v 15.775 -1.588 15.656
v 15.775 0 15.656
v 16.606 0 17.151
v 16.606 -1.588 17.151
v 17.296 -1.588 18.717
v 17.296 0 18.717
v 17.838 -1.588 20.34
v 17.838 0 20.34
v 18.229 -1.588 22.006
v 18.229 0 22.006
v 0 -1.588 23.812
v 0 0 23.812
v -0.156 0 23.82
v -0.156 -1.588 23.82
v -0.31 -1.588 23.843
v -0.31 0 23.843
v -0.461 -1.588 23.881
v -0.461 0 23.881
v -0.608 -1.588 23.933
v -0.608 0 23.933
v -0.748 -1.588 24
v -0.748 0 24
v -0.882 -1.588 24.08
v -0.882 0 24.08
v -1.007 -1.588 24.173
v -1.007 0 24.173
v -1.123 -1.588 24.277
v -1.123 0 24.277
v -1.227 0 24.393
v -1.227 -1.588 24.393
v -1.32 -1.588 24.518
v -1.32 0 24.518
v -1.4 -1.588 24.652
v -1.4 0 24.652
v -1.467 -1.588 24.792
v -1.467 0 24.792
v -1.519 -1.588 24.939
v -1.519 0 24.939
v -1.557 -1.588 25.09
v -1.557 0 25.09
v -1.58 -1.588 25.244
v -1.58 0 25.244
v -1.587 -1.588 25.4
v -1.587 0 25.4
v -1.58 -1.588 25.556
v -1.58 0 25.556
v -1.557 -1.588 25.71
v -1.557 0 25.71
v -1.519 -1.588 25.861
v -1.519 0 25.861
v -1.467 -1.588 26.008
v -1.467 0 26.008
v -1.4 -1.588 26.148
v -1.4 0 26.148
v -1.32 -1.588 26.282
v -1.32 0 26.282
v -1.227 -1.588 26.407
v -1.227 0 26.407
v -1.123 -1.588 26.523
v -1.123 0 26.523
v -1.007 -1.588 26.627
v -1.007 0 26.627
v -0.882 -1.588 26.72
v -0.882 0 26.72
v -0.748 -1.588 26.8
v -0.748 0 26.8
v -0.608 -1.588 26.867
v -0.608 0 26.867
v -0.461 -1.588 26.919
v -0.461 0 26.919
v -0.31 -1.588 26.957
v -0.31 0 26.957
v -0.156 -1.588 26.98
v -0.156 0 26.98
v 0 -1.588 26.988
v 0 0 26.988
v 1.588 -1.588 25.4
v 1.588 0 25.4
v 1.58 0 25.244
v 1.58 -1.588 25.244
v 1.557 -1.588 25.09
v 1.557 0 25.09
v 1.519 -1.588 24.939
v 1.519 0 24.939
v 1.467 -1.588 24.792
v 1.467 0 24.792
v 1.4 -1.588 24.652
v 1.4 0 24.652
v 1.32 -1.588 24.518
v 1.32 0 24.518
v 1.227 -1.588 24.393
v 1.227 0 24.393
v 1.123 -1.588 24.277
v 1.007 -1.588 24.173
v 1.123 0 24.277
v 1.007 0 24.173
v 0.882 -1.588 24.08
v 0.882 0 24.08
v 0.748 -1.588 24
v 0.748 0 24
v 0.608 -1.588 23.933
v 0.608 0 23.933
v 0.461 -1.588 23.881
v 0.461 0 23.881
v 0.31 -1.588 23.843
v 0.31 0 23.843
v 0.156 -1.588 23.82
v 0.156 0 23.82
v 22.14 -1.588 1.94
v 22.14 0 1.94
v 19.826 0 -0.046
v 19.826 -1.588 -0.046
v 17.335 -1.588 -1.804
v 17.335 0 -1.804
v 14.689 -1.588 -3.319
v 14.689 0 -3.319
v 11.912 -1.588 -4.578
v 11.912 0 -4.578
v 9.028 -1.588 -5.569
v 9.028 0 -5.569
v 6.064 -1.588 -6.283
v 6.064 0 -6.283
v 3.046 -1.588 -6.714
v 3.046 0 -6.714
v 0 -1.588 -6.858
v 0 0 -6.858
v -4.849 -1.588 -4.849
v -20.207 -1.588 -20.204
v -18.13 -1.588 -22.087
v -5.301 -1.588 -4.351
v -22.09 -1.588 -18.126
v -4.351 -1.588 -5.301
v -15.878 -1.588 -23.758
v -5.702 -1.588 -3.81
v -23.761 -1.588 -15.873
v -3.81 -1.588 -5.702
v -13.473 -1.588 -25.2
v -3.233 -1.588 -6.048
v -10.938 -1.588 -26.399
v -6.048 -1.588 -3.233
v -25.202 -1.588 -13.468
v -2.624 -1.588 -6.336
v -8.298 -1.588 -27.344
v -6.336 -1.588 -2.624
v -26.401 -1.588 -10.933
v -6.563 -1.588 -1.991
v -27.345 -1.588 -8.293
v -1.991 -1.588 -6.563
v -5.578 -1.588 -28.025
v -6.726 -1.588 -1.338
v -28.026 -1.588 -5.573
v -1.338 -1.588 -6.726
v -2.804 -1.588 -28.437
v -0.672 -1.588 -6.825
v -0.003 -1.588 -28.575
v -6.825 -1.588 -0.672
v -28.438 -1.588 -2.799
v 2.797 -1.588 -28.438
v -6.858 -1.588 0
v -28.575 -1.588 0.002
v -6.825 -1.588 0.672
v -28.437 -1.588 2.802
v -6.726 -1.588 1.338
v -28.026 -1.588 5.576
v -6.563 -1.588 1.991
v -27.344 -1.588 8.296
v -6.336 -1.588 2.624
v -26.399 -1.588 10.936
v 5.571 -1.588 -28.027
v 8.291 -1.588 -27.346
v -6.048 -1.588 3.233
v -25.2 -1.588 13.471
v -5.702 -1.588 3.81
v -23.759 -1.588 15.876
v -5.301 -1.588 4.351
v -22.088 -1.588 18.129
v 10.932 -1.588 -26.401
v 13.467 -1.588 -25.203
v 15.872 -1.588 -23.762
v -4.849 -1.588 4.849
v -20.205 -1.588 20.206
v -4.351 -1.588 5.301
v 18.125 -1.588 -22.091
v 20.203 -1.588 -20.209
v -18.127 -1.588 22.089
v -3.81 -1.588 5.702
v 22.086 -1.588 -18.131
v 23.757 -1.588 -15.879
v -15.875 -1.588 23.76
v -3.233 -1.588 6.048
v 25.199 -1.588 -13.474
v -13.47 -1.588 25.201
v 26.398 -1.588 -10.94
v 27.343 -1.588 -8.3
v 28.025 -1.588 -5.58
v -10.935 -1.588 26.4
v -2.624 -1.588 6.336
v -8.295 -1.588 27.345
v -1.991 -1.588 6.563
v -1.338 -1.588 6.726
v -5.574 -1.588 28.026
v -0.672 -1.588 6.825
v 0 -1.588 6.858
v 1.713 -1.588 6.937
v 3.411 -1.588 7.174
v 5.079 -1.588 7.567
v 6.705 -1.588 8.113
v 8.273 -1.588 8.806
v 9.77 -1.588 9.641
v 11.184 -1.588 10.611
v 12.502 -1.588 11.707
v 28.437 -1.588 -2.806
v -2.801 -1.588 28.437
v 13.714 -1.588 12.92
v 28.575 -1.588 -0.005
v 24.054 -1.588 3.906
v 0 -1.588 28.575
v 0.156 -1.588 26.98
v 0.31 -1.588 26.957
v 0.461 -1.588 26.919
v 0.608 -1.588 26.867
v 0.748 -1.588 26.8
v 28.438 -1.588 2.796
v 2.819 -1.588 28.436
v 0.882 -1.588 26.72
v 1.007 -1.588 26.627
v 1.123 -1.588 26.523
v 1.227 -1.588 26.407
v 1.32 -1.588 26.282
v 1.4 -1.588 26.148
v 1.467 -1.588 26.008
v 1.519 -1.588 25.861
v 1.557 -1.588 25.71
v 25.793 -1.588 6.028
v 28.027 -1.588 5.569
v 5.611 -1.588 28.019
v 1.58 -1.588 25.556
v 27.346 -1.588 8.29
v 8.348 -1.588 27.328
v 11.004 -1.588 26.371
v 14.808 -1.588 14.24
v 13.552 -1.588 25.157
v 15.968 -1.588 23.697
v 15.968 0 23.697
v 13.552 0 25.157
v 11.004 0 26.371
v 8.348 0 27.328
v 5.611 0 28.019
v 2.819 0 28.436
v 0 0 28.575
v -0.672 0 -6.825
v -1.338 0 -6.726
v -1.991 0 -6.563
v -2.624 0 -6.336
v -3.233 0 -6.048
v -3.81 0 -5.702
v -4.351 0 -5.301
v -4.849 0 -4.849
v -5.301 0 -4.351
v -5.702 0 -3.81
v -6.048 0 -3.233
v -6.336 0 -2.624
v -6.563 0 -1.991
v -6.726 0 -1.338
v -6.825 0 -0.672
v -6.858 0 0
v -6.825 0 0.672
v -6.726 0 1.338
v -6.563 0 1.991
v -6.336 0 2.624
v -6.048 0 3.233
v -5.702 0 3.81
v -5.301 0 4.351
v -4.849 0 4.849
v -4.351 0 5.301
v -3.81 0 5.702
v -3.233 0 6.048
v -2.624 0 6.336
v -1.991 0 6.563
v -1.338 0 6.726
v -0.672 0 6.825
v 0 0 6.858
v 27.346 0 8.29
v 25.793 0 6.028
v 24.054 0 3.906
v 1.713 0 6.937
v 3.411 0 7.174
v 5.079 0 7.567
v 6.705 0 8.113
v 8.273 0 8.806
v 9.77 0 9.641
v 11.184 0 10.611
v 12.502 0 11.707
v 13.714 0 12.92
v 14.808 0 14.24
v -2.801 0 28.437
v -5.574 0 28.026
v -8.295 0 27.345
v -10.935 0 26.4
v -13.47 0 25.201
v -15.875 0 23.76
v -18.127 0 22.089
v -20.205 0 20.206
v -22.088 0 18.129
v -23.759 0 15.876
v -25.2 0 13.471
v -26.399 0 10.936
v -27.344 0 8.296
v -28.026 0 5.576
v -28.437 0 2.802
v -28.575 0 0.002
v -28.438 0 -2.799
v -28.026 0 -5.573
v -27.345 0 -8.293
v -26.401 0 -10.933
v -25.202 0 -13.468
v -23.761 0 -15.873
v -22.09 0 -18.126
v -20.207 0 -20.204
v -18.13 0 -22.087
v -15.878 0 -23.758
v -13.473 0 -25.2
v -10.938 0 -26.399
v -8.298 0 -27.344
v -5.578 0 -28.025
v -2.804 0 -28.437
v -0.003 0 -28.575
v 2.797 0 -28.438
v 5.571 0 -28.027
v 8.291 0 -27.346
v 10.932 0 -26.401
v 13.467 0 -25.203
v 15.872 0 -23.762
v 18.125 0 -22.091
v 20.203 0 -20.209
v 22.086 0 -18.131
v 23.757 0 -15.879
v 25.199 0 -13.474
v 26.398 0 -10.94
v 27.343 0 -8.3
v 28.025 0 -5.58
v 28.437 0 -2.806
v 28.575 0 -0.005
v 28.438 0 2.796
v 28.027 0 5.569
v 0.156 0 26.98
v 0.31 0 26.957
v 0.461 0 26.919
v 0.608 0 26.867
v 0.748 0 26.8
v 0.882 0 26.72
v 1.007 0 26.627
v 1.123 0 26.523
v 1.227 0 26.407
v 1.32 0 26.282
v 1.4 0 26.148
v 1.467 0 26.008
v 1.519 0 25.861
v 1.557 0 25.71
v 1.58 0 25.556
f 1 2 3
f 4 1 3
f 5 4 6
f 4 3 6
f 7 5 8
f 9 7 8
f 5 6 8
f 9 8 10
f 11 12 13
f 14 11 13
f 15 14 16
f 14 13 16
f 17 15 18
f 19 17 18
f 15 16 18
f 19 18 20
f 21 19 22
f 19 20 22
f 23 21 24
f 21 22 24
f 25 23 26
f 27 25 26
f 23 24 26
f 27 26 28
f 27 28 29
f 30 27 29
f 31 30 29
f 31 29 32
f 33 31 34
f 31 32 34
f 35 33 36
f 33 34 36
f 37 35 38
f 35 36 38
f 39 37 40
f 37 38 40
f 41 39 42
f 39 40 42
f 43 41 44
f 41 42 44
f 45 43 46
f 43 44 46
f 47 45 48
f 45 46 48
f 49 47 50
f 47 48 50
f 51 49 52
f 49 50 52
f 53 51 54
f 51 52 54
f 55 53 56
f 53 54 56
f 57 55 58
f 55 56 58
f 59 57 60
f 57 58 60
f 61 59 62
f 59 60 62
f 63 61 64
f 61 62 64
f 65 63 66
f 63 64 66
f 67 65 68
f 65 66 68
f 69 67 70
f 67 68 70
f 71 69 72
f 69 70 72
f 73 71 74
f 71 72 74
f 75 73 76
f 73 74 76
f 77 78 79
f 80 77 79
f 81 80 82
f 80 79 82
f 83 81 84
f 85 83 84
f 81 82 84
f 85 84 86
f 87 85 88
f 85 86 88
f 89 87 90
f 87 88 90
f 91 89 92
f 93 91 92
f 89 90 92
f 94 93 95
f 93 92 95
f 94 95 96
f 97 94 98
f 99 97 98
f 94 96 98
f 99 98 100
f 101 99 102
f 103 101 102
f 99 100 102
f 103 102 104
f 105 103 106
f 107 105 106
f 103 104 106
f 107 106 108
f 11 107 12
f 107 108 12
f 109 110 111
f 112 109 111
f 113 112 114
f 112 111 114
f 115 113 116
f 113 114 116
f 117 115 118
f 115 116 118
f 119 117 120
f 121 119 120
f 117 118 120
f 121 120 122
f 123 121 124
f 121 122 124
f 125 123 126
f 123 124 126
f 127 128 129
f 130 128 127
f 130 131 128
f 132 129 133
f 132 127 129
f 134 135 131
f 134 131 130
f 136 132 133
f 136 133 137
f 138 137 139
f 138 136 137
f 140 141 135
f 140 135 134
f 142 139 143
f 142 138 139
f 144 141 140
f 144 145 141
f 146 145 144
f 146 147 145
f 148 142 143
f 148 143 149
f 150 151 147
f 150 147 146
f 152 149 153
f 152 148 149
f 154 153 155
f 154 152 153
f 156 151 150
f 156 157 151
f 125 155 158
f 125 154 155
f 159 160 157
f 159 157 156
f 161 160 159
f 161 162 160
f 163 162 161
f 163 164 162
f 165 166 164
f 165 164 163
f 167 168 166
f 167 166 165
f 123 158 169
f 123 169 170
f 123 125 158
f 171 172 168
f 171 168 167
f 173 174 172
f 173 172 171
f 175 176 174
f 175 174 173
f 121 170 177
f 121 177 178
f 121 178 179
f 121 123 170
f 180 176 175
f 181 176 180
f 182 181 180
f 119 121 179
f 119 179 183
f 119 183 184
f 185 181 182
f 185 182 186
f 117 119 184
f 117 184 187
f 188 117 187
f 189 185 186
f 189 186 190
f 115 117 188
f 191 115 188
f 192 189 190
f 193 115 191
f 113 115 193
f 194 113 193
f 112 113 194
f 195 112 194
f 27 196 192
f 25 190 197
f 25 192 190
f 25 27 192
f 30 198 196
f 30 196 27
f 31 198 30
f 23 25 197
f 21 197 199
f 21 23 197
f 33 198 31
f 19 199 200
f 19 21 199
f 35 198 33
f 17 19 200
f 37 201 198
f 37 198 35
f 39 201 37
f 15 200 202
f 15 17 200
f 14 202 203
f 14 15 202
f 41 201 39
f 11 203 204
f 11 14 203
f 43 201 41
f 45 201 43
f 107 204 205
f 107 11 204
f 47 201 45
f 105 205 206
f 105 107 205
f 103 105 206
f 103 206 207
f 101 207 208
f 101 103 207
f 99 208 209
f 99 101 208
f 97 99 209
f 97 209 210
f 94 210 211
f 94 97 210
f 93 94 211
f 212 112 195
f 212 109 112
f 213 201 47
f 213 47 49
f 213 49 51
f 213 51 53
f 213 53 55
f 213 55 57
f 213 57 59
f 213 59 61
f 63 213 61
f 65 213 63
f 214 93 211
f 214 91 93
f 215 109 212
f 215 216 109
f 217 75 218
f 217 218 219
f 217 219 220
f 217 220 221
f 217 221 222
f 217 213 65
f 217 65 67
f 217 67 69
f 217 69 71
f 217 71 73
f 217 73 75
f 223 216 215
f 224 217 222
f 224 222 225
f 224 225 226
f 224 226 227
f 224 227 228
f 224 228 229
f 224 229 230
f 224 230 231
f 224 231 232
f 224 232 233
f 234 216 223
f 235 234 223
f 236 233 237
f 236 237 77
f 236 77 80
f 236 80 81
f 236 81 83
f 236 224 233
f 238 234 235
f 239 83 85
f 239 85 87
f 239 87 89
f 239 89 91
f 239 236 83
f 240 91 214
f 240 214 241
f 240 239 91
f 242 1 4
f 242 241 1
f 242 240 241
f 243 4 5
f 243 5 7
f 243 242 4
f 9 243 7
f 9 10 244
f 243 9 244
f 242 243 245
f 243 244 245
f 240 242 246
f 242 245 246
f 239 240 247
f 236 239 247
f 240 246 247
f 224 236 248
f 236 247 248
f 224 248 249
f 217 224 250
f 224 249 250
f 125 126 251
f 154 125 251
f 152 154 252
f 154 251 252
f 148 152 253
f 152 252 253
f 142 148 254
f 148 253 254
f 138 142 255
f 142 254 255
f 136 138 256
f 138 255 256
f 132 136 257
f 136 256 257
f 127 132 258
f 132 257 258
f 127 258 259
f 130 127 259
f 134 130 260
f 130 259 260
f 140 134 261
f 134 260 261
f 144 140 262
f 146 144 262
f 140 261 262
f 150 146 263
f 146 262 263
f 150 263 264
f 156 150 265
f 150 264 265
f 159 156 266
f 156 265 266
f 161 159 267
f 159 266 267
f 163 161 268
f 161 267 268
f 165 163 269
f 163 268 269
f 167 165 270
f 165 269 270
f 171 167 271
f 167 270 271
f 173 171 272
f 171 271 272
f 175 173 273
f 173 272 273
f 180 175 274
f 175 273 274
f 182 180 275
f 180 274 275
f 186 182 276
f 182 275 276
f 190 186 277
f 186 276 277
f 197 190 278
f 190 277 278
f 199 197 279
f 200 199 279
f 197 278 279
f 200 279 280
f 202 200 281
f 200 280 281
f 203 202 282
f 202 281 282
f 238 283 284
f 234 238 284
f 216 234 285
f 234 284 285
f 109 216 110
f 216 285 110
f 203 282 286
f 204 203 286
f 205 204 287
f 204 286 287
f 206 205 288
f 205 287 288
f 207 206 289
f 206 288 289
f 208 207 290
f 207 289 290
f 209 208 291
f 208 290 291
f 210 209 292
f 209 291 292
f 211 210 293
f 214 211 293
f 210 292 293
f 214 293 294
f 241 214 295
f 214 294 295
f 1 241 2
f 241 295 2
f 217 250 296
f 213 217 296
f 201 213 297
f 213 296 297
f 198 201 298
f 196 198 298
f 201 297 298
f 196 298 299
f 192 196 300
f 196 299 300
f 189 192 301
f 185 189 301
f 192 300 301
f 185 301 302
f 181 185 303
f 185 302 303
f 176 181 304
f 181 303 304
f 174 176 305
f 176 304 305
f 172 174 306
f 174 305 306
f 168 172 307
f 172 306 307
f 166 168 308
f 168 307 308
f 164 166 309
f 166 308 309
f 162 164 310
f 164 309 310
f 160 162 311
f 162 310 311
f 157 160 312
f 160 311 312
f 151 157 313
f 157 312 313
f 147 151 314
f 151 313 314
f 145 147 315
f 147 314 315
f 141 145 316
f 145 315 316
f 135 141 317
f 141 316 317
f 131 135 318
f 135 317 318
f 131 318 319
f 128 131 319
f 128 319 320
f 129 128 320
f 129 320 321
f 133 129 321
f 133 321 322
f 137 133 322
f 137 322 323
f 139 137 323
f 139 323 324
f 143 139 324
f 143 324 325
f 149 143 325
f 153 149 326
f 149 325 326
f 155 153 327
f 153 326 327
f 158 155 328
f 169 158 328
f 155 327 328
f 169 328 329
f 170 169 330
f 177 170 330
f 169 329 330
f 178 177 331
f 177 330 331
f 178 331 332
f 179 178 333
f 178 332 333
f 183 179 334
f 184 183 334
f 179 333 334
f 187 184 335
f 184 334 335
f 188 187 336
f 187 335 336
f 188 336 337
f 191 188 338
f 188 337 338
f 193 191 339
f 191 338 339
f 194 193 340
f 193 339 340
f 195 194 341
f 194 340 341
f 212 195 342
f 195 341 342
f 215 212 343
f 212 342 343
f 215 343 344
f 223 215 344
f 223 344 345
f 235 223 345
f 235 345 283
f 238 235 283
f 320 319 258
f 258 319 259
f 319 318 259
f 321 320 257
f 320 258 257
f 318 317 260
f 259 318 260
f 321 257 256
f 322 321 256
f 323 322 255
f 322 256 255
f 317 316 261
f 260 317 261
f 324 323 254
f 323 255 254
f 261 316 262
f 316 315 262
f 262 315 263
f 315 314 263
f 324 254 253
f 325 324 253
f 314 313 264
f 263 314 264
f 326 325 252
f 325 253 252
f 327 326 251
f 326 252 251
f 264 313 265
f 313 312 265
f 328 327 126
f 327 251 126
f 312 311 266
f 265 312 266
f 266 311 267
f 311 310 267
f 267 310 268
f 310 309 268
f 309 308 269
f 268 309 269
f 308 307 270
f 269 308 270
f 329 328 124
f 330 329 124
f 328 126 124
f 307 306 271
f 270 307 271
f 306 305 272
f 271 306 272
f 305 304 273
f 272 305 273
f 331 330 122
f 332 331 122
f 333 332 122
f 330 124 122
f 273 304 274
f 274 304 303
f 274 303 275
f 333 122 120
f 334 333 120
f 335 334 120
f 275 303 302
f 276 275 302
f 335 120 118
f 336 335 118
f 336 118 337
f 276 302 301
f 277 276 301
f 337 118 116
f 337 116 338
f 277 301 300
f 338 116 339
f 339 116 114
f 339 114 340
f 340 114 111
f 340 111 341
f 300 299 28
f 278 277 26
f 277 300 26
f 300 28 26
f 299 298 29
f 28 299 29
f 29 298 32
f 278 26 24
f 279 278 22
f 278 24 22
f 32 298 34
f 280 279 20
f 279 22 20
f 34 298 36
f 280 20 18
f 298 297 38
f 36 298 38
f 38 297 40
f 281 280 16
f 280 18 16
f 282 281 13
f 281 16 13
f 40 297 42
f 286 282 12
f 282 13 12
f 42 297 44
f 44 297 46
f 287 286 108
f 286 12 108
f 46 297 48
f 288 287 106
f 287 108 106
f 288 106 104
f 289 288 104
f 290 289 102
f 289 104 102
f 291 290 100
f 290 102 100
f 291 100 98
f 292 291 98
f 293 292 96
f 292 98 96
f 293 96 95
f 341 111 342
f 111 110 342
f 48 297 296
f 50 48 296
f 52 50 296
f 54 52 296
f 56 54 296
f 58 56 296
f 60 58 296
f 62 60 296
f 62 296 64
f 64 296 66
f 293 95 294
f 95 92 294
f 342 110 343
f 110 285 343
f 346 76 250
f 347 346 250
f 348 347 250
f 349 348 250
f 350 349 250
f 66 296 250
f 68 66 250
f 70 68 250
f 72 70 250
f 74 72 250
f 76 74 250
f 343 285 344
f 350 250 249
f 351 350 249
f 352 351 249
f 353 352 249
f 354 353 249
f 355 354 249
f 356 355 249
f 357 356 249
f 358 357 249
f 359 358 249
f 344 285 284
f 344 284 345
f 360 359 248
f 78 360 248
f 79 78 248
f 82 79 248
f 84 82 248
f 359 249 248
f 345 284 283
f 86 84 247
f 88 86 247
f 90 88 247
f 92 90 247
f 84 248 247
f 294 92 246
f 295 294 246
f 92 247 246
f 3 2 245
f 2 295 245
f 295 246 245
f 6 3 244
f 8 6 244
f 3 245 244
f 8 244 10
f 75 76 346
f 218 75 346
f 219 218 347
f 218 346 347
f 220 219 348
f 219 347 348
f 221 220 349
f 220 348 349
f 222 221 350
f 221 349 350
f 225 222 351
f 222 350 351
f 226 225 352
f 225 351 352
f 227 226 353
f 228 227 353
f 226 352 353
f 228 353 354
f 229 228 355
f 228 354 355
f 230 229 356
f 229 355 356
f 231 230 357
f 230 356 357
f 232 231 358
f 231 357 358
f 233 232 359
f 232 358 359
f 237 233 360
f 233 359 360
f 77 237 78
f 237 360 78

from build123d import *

# Parameters (mm, degrees)
F1_DEPTH = 1.5875


with BuildPart() as f1:
    # F0 (on Front) → F1 (new body)
    with BuildSketch(Plane.XZ):
        with BuildLine():
            ThreePointArc((15.7750619272, 15.6556075), (17.2957745251, 18.7170405077), (18.2286550123, 22.0056075))
            ThreePointArc((18.2286550123, 22.0056075), (9.6881471574, 26.8825301945), (0, 28.575))
            Line((0, 28.575), (0, 26.9875))
            ThreePointArc((0, 26.9875), (1.1225320151, 26.5225320151), (1.5875, 25.4))
            ThreePointArc((1.5875, 25.4), (1.1225320151, 24.2774679849), (0, 23.8125))
            Line((0, 23.8125), (0, 22.225))
            ThreePointArc((0, 22.225), (8.5441426812, 20.5170234402), (15.7750619272, 15.6556075))
        make_face()
        with BuildLine():
            Line((0, 26.9875), (0, 28.575))
            ThreePointArc((0, 28.575), (-17.0243221699, -22.9500126287), (27.3461703442, 8.2896075))
            ThreePointArc((27.3461703442, 8.2896075), (24.9460595827, 4.9482842946), (22.140202071, 1.9396075))
            ThreePointArc((22.140202071, 1.9396075), (-15.0140409003, -16.3868606159), (0, 22.225))
            Line((0, 22.225), (0, 23.8125))
            ThreePointArc((0, 23.8125), (-1.5875, 25.4), (0, 26.9875))
        make_face()
        with BuildLine():
            ThreePointArc((0, 6.858), (9.0312025297, 9.2060769155), (15.7750619272, 15.6556075))
            ThreePointArc((15.7750619272, 15.6556075), (8.5441426812, 20.5170234402), (0, 22.225))
            Line((0, 22.225), (0, 6.858))
        make_face()
        with BuildLine():
            Line((0, 6.858), (0, 22.225))
            ThreePointArc((0, 22.225), (-15.0140409003, -16.3868606159), (22.140202071, 1.9396075))
            ThreePointArc((22.140202071, 1.9396075), (11.9120364072, -4.5780244952), (0, -6.858))
            ThreePointArc((0, -6.858), (-6.858, 0), (0, 6.858))
        make_face()
    extrude(amount=F1_DEPTH)


solid = f1.part
